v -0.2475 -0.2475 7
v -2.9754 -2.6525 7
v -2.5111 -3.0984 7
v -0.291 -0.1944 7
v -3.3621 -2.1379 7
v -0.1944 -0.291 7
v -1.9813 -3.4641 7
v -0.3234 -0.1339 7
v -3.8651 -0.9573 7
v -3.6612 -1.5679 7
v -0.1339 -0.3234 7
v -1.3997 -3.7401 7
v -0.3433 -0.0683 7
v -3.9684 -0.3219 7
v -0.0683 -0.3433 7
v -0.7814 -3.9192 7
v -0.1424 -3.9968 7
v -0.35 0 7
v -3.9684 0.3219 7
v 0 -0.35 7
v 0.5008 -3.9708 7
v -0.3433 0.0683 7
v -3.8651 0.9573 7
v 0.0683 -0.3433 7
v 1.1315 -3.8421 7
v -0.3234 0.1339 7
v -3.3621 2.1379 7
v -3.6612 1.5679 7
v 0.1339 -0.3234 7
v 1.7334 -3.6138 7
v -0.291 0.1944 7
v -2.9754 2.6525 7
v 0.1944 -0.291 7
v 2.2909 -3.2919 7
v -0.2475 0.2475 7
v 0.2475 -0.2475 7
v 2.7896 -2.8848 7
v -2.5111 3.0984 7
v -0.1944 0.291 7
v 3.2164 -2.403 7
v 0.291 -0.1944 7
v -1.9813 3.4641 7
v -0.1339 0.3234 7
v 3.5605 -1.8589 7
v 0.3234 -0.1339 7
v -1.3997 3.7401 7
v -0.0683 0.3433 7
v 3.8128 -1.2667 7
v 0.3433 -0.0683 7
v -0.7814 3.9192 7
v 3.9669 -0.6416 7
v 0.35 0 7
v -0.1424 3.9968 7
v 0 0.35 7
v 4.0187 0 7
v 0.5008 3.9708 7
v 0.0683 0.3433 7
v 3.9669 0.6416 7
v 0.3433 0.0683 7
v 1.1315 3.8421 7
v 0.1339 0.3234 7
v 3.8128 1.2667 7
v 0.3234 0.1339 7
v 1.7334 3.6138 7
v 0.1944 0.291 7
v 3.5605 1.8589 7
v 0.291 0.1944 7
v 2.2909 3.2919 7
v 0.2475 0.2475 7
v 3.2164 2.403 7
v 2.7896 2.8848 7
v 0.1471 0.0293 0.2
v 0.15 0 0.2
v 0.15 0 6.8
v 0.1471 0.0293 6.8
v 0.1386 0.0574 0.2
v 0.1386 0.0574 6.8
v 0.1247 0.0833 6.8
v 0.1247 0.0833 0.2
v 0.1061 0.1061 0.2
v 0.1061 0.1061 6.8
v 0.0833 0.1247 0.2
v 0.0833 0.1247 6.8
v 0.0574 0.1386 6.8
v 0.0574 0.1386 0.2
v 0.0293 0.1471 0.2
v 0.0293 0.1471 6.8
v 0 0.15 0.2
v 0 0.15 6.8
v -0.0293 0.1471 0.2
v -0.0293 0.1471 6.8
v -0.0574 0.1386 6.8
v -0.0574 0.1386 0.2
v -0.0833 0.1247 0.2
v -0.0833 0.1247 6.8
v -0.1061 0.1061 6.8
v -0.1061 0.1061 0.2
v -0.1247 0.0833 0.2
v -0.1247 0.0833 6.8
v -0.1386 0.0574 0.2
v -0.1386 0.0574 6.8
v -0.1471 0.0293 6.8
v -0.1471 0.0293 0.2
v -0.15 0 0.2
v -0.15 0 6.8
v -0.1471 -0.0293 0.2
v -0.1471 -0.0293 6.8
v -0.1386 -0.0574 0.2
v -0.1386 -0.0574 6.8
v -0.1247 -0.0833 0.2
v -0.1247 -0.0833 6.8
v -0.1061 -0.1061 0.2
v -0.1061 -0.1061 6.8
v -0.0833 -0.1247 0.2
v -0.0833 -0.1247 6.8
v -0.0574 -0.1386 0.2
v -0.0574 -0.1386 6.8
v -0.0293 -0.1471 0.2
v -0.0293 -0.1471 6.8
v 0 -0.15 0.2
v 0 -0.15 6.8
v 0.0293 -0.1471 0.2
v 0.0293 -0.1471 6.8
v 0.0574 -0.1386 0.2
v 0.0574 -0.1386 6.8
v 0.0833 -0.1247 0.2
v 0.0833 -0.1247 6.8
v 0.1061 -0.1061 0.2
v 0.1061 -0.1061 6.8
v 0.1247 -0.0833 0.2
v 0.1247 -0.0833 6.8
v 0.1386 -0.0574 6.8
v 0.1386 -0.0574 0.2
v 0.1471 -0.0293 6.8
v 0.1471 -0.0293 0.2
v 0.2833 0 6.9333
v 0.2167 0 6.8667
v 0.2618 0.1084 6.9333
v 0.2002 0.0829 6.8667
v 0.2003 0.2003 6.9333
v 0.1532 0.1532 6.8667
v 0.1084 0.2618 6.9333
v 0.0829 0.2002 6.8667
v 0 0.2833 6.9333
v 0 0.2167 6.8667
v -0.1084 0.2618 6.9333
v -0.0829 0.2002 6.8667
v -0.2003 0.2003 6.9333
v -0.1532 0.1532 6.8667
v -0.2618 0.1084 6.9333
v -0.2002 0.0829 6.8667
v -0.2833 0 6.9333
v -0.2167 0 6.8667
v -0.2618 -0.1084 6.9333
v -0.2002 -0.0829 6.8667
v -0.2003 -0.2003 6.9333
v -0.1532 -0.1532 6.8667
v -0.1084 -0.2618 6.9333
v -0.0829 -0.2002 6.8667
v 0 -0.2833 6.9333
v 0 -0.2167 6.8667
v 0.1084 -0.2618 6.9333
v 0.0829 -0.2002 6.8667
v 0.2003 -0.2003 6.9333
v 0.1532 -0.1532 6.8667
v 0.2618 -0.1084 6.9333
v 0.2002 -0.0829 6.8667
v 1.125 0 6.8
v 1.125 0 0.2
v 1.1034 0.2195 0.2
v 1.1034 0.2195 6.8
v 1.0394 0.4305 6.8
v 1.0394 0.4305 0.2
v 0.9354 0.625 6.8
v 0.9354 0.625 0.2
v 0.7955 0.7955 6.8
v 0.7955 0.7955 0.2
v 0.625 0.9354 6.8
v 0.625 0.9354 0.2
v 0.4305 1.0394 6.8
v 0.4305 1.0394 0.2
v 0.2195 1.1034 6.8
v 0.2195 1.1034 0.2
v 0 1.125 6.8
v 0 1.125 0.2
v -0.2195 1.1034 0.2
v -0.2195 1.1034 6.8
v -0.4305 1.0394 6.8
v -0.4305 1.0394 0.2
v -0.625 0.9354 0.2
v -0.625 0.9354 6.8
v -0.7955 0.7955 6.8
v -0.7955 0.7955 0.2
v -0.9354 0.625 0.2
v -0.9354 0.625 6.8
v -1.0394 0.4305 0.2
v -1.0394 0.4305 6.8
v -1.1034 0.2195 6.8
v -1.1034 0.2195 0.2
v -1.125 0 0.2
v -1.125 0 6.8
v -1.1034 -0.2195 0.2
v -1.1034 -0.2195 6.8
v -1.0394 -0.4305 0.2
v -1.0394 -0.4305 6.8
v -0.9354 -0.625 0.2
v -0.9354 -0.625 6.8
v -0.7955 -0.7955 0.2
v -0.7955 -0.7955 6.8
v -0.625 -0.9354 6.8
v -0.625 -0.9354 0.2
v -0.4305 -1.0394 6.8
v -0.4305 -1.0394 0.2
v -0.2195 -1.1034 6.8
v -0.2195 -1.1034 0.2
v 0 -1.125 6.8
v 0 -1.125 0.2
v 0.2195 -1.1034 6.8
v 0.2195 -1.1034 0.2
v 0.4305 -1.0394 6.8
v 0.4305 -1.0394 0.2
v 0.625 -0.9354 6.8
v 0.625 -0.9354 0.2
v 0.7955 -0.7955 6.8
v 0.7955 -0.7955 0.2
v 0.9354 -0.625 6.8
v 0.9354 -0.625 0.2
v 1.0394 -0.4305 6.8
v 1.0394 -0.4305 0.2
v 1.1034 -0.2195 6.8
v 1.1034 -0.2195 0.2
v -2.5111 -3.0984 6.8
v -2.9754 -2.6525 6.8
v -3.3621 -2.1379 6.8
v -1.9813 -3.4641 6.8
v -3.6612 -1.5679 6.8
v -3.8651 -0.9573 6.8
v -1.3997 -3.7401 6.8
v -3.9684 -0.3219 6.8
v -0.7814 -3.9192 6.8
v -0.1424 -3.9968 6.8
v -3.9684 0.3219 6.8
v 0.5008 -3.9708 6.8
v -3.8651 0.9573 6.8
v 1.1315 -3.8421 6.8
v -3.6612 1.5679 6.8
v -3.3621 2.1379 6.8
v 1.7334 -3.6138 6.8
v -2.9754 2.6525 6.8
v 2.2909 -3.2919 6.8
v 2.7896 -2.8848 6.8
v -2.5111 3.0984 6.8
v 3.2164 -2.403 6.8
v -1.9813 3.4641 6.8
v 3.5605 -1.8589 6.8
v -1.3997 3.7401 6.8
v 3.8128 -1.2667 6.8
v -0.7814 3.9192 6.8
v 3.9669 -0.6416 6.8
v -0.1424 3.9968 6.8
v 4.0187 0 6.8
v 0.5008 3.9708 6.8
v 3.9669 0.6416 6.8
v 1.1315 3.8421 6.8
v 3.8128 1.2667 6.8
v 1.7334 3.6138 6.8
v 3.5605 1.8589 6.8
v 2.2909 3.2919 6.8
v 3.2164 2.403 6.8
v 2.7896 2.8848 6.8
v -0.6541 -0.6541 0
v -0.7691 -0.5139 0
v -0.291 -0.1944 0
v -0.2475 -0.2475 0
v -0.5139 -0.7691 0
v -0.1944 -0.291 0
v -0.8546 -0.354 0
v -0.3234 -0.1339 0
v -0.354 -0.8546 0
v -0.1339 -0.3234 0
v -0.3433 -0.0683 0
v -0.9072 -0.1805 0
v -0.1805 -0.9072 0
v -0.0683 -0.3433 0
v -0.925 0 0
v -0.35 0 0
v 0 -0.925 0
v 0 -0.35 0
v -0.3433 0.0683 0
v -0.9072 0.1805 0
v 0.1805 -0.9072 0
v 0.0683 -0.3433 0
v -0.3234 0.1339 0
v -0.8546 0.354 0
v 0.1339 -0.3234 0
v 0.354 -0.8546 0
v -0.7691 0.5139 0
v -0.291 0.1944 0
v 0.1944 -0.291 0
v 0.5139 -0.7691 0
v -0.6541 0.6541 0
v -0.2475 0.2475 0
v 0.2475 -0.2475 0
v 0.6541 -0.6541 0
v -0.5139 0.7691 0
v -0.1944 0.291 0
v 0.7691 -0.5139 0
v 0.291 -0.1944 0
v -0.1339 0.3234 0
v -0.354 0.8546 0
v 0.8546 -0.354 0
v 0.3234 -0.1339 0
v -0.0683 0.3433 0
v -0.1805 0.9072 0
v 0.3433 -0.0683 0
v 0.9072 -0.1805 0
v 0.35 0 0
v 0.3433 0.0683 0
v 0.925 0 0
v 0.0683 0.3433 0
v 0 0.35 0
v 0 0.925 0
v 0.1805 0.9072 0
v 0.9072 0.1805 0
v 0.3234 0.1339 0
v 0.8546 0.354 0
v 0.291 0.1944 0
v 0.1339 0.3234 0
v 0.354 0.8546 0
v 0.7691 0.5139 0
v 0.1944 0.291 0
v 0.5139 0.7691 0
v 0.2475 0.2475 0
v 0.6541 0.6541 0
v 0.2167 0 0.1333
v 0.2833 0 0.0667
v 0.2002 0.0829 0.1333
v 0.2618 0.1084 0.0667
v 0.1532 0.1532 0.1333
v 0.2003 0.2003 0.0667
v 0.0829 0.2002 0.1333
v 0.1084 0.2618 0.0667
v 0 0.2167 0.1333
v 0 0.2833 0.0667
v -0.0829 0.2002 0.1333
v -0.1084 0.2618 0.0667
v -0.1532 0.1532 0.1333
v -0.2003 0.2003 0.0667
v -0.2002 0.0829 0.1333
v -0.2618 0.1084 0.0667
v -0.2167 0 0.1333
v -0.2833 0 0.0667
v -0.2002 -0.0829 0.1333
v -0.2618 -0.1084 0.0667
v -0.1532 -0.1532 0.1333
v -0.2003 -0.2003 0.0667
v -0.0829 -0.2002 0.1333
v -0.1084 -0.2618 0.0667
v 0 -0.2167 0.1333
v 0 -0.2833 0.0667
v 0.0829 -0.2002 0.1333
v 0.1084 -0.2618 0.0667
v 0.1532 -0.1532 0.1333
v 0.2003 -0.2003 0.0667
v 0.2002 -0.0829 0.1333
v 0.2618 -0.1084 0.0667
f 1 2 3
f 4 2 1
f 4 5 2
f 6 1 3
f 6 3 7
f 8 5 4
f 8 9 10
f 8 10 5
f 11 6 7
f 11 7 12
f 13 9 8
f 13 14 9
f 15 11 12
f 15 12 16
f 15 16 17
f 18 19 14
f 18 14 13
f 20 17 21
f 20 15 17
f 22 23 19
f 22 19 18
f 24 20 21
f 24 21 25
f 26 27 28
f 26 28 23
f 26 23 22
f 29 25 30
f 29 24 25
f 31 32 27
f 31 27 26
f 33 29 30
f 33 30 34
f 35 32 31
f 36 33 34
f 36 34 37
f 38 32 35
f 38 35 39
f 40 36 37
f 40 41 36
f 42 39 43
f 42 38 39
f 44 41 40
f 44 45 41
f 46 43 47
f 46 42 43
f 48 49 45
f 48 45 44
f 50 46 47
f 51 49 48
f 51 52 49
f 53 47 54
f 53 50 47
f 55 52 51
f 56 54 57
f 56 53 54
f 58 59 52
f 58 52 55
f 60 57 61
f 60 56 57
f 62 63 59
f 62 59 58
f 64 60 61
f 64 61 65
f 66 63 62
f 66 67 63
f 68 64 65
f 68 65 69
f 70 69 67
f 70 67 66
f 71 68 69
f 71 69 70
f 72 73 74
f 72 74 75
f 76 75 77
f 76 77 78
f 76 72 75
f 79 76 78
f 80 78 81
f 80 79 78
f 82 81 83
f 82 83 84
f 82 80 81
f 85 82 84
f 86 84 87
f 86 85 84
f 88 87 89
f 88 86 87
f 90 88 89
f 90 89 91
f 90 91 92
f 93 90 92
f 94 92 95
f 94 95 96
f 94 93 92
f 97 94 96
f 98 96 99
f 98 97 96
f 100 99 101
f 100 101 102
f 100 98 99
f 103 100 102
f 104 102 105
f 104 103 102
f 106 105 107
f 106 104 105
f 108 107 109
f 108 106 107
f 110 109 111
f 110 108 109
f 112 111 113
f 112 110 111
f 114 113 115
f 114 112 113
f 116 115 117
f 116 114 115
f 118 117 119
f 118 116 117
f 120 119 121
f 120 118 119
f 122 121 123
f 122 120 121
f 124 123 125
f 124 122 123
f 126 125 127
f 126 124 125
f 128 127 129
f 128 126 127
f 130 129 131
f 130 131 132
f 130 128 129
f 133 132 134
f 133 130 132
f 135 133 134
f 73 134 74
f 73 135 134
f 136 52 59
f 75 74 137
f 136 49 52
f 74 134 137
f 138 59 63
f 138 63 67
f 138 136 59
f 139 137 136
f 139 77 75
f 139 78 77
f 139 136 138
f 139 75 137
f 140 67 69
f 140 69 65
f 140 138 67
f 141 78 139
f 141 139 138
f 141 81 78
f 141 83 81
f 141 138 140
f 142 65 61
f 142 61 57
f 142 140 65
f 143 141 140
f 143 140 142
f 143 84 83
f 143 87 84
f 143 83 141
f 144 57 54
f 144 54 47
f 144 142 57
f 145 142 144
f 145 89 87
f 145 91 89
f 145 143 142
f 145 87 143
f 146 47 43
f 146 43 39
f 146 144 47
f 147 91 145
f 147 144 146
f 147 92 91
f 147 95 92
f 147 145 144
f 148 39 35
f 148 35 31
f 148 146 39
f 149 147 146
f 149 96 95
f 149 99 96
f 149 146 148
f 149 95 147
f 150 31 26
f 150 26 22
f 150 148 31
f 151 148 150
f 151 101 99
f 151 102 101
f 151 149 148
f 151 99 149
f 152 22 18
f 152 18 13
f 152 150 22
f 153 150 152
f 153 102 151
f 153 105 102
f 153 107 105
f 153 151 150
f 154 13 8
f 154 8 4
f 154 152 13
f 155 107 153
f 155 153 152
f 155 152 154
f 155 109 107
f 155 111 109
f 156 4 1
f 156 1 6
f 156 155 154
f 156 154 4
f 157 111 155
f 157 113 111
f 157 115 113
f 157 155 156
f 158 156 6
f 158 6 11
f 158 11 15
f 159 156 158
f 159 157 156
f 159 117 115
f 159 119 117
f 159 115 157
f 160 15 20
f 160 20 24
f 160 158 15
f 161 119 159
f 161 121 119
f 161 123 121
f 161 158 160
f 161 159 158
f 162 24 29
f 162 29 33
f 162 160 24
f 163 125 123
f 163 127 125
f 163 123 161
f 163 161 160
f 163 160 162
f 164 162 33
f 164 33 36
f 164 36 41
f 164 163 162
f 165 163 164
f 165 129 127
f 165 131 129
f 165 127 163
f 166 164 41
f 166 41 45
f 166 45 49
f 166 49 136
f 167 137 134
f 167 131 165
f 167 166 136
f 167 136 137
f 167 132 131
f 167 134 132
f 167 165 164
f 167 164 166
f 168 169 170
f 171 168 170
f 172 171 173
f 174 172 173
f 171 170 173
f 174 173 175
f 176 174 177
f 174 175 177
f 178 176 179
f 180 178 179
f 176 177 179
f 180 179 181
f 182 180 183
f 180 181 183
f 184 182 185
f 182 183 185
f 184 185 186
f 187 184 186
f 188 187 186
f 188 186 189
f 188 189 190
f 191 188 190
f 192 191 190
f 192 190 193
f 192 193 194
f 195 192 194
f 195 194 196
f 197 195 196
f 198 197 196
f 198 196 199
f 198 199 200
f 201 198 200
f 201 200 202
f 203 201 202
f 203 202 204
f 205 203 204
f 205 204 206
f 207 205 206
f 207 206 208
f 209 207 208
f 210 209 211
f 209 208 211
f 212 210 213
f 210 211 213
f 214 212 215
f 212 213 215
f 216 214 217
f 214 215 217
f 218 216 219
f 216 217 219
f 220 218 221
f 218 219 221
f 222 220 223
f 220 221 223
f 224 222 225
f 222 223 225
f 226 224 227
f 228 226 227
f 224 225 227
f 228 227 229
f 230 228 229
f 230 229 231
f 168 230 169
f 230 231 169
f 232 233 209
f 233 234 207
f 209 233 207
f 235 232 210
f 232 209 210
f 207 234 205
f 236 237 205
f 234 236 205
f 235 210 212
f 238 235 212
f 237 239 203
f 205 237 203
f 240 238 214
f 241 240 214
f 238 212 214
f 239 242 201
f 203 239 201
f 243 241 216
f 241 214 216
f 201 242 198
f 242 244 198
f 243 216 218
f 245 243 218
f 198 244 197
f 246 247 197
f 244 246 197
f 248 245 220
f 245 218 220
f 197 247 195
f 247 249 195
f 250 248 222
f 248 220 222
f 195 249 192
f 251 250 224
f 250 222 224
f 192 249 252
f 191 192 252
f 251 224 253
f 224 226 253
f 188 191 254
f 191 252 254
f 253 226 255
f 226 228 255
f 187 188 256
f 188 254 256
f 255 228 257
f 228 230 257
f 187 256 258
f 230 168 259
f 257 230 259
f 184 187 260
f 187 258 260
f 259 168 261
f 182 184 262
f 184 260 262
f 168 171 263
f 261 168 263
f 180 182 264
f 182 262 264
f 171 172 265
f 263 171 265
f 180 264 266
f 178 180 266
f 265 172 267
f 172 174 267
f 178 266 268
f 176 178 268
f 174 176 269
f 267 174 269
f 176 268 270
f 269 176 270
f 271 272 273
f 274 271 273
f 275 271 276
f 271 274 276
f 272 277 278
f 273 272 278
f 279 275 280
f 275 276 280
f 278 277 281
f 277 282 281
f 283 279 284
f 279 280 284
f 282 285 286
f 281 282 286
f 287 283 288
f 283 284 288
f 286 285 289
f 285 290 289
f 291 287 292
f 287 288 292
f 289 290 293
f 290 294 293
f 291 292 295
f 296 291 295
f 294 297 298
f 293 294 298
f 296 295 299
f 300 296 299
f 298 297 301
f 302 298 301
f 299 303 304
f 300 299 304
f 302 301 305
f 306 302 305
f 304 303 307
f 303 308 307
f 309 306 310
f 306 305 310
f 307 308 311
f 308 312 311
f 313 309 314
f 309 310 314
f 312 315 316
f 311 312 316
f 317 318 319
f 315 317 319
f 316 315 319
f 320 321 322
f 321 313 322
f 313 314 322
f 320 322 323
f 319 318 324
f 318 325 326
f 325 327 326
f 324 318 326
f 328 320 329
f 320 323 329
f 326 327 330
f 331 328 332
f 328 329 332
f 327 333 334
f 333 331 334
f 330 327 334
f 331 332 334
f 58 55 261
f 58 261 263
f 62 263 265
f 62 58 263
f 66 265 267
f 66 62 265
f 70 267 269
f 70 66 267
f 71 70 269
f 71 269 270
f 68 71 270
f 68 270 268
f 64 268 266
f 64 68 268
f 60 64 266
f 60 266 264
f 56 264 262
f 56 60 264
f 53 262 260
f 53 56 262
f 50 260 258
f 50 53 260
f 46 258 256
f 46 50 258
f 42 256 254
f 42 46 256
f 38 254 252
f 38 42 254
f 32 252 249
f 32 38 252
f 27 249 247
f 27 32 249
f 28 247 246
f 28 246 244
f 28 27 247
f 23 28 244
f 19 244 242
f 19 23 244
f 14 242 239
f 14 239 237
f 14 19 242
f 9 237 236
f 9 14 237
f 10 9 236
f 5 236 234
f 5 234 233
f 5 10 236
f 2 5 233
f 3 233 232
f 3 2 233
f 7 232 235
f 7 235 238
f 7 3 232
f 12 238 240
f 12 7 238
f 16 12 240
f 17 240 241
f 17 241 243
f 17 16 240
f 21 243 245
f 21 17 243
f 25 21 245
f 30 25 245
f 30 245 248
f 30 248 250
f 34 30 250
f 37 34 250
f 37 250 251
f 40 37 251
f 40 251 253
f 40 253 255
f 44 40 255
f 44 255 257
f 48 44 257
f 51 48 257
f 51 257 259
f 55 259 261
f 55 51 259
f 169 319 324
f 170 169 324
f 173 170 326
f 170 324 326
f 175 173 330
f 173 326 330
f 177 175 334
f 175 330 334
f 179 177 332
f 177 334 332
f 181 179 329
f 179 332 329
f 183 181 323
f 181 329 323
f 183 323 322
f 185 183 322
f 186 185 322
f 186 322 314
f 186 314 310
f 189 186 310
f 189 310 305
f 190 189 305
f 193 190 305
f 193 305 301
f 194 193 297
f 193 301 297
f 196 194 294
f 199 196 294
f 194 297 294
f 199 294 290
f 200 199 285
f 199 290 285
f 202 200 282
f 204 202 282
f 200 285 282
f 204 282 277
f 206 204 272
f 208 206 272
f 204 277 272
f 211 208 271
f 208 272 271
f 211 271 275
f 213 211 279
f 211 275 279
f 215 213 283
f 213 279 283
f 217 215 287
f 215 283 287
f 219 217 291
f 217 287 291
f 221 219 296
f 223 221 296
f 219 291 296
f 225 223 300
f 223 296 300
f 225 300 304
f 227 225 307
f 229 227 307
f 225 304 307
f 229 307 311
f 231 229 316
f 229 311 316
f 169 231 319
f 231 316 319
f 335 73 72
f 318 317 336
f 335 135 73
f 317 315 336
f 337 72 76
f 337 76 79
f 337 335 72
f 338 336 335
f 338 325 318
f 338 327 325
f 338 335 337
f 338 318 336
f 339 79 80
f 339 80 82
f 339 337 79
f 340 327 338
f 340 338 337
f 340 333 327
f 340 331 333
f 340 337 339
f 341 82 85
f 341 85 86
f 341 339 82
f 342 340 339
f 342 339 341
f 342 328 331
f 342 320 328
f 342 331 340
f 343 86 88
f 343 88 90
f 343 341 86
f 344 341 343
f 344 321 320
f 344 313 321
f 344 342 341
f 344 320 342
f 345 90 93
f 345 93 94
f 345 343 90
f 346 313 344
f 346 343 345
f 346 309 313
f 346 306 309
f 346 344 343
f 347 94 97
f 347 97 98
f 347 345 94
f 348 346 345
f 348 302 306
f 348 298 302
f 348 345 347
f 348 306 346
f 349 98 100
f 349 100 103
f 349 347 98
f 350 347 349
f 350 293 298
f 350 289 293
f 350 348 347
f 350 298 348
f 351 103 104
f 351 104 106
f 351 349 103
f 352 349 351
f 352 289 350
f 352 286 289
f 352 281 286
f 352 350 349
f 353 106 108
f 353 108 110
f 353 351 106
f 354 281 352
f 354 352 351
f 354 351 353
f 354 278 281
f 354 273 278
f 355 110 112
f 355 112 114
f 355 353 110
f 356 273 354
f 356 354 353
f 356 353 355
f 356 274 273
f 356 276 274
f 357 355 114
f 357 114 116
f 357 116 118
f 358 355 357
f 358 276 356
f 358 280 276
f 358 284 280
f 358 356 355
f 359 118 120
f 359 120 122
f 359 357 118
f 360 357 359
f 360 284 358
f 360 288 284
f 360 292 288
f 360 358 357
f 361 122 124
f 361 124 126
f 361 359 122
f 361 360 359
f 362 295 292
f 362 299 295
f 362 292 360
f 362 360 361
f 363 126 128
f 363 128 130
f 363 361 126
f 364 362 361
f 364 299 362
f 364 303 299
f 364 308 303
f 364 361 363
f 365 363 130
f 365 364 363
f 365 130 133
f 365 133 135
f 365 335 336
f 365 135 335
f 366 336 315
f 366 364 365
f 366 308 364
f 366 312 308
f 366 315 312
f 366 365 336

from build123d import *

# Parameters (mm, degrees)
SKETCH1_R           = 1.125
SKETCH1_R_2         = 0.15
BOSS_EXTRUDE1_DEPTH = 7
SKETCH2_R           = 4
SKETCH2_R_2         = 1.125
BOSS_EXTRUDE2_DEPTH = 0.2
CHAMFER1_SIZE       = 0.2


with BuildPart() as part:
    # Sketch1 → Boss-Extrude1 (new body)
    with BuildSketch(Plane.XY):
        Circle(SKETCH1_R)
        Circle(SKETCH1_R_2, mode=Mode.SUBTRACT)
    extrude(amount=BOSS_EXTRUDE1_DEPTH)

    # Sketch2 → Boss-Extrude2 (add)
    with BuildSketch(Plane.XY.offset(7)):
        with Locations((0.018669882, 0)):
            Circle(SKETCH2_R)
        Circle(SKETCH2_R_2, mode=Mode.SUBTRACT)
    extrude(amount=-BOSS_EXTRUDE2_DEPTH)

    # Chamfer1
    chamfer1_edges = [part.edges().sort_by_distance(p)[0] for p in [
        (-1.125, 0, 0),
        (-0.15, 0, 0),
        (-0.15, 0, 7),
    ]]
    chamfer(chamfer1_edges, length=CHAMFER1_SIZE)


solid = part.part
